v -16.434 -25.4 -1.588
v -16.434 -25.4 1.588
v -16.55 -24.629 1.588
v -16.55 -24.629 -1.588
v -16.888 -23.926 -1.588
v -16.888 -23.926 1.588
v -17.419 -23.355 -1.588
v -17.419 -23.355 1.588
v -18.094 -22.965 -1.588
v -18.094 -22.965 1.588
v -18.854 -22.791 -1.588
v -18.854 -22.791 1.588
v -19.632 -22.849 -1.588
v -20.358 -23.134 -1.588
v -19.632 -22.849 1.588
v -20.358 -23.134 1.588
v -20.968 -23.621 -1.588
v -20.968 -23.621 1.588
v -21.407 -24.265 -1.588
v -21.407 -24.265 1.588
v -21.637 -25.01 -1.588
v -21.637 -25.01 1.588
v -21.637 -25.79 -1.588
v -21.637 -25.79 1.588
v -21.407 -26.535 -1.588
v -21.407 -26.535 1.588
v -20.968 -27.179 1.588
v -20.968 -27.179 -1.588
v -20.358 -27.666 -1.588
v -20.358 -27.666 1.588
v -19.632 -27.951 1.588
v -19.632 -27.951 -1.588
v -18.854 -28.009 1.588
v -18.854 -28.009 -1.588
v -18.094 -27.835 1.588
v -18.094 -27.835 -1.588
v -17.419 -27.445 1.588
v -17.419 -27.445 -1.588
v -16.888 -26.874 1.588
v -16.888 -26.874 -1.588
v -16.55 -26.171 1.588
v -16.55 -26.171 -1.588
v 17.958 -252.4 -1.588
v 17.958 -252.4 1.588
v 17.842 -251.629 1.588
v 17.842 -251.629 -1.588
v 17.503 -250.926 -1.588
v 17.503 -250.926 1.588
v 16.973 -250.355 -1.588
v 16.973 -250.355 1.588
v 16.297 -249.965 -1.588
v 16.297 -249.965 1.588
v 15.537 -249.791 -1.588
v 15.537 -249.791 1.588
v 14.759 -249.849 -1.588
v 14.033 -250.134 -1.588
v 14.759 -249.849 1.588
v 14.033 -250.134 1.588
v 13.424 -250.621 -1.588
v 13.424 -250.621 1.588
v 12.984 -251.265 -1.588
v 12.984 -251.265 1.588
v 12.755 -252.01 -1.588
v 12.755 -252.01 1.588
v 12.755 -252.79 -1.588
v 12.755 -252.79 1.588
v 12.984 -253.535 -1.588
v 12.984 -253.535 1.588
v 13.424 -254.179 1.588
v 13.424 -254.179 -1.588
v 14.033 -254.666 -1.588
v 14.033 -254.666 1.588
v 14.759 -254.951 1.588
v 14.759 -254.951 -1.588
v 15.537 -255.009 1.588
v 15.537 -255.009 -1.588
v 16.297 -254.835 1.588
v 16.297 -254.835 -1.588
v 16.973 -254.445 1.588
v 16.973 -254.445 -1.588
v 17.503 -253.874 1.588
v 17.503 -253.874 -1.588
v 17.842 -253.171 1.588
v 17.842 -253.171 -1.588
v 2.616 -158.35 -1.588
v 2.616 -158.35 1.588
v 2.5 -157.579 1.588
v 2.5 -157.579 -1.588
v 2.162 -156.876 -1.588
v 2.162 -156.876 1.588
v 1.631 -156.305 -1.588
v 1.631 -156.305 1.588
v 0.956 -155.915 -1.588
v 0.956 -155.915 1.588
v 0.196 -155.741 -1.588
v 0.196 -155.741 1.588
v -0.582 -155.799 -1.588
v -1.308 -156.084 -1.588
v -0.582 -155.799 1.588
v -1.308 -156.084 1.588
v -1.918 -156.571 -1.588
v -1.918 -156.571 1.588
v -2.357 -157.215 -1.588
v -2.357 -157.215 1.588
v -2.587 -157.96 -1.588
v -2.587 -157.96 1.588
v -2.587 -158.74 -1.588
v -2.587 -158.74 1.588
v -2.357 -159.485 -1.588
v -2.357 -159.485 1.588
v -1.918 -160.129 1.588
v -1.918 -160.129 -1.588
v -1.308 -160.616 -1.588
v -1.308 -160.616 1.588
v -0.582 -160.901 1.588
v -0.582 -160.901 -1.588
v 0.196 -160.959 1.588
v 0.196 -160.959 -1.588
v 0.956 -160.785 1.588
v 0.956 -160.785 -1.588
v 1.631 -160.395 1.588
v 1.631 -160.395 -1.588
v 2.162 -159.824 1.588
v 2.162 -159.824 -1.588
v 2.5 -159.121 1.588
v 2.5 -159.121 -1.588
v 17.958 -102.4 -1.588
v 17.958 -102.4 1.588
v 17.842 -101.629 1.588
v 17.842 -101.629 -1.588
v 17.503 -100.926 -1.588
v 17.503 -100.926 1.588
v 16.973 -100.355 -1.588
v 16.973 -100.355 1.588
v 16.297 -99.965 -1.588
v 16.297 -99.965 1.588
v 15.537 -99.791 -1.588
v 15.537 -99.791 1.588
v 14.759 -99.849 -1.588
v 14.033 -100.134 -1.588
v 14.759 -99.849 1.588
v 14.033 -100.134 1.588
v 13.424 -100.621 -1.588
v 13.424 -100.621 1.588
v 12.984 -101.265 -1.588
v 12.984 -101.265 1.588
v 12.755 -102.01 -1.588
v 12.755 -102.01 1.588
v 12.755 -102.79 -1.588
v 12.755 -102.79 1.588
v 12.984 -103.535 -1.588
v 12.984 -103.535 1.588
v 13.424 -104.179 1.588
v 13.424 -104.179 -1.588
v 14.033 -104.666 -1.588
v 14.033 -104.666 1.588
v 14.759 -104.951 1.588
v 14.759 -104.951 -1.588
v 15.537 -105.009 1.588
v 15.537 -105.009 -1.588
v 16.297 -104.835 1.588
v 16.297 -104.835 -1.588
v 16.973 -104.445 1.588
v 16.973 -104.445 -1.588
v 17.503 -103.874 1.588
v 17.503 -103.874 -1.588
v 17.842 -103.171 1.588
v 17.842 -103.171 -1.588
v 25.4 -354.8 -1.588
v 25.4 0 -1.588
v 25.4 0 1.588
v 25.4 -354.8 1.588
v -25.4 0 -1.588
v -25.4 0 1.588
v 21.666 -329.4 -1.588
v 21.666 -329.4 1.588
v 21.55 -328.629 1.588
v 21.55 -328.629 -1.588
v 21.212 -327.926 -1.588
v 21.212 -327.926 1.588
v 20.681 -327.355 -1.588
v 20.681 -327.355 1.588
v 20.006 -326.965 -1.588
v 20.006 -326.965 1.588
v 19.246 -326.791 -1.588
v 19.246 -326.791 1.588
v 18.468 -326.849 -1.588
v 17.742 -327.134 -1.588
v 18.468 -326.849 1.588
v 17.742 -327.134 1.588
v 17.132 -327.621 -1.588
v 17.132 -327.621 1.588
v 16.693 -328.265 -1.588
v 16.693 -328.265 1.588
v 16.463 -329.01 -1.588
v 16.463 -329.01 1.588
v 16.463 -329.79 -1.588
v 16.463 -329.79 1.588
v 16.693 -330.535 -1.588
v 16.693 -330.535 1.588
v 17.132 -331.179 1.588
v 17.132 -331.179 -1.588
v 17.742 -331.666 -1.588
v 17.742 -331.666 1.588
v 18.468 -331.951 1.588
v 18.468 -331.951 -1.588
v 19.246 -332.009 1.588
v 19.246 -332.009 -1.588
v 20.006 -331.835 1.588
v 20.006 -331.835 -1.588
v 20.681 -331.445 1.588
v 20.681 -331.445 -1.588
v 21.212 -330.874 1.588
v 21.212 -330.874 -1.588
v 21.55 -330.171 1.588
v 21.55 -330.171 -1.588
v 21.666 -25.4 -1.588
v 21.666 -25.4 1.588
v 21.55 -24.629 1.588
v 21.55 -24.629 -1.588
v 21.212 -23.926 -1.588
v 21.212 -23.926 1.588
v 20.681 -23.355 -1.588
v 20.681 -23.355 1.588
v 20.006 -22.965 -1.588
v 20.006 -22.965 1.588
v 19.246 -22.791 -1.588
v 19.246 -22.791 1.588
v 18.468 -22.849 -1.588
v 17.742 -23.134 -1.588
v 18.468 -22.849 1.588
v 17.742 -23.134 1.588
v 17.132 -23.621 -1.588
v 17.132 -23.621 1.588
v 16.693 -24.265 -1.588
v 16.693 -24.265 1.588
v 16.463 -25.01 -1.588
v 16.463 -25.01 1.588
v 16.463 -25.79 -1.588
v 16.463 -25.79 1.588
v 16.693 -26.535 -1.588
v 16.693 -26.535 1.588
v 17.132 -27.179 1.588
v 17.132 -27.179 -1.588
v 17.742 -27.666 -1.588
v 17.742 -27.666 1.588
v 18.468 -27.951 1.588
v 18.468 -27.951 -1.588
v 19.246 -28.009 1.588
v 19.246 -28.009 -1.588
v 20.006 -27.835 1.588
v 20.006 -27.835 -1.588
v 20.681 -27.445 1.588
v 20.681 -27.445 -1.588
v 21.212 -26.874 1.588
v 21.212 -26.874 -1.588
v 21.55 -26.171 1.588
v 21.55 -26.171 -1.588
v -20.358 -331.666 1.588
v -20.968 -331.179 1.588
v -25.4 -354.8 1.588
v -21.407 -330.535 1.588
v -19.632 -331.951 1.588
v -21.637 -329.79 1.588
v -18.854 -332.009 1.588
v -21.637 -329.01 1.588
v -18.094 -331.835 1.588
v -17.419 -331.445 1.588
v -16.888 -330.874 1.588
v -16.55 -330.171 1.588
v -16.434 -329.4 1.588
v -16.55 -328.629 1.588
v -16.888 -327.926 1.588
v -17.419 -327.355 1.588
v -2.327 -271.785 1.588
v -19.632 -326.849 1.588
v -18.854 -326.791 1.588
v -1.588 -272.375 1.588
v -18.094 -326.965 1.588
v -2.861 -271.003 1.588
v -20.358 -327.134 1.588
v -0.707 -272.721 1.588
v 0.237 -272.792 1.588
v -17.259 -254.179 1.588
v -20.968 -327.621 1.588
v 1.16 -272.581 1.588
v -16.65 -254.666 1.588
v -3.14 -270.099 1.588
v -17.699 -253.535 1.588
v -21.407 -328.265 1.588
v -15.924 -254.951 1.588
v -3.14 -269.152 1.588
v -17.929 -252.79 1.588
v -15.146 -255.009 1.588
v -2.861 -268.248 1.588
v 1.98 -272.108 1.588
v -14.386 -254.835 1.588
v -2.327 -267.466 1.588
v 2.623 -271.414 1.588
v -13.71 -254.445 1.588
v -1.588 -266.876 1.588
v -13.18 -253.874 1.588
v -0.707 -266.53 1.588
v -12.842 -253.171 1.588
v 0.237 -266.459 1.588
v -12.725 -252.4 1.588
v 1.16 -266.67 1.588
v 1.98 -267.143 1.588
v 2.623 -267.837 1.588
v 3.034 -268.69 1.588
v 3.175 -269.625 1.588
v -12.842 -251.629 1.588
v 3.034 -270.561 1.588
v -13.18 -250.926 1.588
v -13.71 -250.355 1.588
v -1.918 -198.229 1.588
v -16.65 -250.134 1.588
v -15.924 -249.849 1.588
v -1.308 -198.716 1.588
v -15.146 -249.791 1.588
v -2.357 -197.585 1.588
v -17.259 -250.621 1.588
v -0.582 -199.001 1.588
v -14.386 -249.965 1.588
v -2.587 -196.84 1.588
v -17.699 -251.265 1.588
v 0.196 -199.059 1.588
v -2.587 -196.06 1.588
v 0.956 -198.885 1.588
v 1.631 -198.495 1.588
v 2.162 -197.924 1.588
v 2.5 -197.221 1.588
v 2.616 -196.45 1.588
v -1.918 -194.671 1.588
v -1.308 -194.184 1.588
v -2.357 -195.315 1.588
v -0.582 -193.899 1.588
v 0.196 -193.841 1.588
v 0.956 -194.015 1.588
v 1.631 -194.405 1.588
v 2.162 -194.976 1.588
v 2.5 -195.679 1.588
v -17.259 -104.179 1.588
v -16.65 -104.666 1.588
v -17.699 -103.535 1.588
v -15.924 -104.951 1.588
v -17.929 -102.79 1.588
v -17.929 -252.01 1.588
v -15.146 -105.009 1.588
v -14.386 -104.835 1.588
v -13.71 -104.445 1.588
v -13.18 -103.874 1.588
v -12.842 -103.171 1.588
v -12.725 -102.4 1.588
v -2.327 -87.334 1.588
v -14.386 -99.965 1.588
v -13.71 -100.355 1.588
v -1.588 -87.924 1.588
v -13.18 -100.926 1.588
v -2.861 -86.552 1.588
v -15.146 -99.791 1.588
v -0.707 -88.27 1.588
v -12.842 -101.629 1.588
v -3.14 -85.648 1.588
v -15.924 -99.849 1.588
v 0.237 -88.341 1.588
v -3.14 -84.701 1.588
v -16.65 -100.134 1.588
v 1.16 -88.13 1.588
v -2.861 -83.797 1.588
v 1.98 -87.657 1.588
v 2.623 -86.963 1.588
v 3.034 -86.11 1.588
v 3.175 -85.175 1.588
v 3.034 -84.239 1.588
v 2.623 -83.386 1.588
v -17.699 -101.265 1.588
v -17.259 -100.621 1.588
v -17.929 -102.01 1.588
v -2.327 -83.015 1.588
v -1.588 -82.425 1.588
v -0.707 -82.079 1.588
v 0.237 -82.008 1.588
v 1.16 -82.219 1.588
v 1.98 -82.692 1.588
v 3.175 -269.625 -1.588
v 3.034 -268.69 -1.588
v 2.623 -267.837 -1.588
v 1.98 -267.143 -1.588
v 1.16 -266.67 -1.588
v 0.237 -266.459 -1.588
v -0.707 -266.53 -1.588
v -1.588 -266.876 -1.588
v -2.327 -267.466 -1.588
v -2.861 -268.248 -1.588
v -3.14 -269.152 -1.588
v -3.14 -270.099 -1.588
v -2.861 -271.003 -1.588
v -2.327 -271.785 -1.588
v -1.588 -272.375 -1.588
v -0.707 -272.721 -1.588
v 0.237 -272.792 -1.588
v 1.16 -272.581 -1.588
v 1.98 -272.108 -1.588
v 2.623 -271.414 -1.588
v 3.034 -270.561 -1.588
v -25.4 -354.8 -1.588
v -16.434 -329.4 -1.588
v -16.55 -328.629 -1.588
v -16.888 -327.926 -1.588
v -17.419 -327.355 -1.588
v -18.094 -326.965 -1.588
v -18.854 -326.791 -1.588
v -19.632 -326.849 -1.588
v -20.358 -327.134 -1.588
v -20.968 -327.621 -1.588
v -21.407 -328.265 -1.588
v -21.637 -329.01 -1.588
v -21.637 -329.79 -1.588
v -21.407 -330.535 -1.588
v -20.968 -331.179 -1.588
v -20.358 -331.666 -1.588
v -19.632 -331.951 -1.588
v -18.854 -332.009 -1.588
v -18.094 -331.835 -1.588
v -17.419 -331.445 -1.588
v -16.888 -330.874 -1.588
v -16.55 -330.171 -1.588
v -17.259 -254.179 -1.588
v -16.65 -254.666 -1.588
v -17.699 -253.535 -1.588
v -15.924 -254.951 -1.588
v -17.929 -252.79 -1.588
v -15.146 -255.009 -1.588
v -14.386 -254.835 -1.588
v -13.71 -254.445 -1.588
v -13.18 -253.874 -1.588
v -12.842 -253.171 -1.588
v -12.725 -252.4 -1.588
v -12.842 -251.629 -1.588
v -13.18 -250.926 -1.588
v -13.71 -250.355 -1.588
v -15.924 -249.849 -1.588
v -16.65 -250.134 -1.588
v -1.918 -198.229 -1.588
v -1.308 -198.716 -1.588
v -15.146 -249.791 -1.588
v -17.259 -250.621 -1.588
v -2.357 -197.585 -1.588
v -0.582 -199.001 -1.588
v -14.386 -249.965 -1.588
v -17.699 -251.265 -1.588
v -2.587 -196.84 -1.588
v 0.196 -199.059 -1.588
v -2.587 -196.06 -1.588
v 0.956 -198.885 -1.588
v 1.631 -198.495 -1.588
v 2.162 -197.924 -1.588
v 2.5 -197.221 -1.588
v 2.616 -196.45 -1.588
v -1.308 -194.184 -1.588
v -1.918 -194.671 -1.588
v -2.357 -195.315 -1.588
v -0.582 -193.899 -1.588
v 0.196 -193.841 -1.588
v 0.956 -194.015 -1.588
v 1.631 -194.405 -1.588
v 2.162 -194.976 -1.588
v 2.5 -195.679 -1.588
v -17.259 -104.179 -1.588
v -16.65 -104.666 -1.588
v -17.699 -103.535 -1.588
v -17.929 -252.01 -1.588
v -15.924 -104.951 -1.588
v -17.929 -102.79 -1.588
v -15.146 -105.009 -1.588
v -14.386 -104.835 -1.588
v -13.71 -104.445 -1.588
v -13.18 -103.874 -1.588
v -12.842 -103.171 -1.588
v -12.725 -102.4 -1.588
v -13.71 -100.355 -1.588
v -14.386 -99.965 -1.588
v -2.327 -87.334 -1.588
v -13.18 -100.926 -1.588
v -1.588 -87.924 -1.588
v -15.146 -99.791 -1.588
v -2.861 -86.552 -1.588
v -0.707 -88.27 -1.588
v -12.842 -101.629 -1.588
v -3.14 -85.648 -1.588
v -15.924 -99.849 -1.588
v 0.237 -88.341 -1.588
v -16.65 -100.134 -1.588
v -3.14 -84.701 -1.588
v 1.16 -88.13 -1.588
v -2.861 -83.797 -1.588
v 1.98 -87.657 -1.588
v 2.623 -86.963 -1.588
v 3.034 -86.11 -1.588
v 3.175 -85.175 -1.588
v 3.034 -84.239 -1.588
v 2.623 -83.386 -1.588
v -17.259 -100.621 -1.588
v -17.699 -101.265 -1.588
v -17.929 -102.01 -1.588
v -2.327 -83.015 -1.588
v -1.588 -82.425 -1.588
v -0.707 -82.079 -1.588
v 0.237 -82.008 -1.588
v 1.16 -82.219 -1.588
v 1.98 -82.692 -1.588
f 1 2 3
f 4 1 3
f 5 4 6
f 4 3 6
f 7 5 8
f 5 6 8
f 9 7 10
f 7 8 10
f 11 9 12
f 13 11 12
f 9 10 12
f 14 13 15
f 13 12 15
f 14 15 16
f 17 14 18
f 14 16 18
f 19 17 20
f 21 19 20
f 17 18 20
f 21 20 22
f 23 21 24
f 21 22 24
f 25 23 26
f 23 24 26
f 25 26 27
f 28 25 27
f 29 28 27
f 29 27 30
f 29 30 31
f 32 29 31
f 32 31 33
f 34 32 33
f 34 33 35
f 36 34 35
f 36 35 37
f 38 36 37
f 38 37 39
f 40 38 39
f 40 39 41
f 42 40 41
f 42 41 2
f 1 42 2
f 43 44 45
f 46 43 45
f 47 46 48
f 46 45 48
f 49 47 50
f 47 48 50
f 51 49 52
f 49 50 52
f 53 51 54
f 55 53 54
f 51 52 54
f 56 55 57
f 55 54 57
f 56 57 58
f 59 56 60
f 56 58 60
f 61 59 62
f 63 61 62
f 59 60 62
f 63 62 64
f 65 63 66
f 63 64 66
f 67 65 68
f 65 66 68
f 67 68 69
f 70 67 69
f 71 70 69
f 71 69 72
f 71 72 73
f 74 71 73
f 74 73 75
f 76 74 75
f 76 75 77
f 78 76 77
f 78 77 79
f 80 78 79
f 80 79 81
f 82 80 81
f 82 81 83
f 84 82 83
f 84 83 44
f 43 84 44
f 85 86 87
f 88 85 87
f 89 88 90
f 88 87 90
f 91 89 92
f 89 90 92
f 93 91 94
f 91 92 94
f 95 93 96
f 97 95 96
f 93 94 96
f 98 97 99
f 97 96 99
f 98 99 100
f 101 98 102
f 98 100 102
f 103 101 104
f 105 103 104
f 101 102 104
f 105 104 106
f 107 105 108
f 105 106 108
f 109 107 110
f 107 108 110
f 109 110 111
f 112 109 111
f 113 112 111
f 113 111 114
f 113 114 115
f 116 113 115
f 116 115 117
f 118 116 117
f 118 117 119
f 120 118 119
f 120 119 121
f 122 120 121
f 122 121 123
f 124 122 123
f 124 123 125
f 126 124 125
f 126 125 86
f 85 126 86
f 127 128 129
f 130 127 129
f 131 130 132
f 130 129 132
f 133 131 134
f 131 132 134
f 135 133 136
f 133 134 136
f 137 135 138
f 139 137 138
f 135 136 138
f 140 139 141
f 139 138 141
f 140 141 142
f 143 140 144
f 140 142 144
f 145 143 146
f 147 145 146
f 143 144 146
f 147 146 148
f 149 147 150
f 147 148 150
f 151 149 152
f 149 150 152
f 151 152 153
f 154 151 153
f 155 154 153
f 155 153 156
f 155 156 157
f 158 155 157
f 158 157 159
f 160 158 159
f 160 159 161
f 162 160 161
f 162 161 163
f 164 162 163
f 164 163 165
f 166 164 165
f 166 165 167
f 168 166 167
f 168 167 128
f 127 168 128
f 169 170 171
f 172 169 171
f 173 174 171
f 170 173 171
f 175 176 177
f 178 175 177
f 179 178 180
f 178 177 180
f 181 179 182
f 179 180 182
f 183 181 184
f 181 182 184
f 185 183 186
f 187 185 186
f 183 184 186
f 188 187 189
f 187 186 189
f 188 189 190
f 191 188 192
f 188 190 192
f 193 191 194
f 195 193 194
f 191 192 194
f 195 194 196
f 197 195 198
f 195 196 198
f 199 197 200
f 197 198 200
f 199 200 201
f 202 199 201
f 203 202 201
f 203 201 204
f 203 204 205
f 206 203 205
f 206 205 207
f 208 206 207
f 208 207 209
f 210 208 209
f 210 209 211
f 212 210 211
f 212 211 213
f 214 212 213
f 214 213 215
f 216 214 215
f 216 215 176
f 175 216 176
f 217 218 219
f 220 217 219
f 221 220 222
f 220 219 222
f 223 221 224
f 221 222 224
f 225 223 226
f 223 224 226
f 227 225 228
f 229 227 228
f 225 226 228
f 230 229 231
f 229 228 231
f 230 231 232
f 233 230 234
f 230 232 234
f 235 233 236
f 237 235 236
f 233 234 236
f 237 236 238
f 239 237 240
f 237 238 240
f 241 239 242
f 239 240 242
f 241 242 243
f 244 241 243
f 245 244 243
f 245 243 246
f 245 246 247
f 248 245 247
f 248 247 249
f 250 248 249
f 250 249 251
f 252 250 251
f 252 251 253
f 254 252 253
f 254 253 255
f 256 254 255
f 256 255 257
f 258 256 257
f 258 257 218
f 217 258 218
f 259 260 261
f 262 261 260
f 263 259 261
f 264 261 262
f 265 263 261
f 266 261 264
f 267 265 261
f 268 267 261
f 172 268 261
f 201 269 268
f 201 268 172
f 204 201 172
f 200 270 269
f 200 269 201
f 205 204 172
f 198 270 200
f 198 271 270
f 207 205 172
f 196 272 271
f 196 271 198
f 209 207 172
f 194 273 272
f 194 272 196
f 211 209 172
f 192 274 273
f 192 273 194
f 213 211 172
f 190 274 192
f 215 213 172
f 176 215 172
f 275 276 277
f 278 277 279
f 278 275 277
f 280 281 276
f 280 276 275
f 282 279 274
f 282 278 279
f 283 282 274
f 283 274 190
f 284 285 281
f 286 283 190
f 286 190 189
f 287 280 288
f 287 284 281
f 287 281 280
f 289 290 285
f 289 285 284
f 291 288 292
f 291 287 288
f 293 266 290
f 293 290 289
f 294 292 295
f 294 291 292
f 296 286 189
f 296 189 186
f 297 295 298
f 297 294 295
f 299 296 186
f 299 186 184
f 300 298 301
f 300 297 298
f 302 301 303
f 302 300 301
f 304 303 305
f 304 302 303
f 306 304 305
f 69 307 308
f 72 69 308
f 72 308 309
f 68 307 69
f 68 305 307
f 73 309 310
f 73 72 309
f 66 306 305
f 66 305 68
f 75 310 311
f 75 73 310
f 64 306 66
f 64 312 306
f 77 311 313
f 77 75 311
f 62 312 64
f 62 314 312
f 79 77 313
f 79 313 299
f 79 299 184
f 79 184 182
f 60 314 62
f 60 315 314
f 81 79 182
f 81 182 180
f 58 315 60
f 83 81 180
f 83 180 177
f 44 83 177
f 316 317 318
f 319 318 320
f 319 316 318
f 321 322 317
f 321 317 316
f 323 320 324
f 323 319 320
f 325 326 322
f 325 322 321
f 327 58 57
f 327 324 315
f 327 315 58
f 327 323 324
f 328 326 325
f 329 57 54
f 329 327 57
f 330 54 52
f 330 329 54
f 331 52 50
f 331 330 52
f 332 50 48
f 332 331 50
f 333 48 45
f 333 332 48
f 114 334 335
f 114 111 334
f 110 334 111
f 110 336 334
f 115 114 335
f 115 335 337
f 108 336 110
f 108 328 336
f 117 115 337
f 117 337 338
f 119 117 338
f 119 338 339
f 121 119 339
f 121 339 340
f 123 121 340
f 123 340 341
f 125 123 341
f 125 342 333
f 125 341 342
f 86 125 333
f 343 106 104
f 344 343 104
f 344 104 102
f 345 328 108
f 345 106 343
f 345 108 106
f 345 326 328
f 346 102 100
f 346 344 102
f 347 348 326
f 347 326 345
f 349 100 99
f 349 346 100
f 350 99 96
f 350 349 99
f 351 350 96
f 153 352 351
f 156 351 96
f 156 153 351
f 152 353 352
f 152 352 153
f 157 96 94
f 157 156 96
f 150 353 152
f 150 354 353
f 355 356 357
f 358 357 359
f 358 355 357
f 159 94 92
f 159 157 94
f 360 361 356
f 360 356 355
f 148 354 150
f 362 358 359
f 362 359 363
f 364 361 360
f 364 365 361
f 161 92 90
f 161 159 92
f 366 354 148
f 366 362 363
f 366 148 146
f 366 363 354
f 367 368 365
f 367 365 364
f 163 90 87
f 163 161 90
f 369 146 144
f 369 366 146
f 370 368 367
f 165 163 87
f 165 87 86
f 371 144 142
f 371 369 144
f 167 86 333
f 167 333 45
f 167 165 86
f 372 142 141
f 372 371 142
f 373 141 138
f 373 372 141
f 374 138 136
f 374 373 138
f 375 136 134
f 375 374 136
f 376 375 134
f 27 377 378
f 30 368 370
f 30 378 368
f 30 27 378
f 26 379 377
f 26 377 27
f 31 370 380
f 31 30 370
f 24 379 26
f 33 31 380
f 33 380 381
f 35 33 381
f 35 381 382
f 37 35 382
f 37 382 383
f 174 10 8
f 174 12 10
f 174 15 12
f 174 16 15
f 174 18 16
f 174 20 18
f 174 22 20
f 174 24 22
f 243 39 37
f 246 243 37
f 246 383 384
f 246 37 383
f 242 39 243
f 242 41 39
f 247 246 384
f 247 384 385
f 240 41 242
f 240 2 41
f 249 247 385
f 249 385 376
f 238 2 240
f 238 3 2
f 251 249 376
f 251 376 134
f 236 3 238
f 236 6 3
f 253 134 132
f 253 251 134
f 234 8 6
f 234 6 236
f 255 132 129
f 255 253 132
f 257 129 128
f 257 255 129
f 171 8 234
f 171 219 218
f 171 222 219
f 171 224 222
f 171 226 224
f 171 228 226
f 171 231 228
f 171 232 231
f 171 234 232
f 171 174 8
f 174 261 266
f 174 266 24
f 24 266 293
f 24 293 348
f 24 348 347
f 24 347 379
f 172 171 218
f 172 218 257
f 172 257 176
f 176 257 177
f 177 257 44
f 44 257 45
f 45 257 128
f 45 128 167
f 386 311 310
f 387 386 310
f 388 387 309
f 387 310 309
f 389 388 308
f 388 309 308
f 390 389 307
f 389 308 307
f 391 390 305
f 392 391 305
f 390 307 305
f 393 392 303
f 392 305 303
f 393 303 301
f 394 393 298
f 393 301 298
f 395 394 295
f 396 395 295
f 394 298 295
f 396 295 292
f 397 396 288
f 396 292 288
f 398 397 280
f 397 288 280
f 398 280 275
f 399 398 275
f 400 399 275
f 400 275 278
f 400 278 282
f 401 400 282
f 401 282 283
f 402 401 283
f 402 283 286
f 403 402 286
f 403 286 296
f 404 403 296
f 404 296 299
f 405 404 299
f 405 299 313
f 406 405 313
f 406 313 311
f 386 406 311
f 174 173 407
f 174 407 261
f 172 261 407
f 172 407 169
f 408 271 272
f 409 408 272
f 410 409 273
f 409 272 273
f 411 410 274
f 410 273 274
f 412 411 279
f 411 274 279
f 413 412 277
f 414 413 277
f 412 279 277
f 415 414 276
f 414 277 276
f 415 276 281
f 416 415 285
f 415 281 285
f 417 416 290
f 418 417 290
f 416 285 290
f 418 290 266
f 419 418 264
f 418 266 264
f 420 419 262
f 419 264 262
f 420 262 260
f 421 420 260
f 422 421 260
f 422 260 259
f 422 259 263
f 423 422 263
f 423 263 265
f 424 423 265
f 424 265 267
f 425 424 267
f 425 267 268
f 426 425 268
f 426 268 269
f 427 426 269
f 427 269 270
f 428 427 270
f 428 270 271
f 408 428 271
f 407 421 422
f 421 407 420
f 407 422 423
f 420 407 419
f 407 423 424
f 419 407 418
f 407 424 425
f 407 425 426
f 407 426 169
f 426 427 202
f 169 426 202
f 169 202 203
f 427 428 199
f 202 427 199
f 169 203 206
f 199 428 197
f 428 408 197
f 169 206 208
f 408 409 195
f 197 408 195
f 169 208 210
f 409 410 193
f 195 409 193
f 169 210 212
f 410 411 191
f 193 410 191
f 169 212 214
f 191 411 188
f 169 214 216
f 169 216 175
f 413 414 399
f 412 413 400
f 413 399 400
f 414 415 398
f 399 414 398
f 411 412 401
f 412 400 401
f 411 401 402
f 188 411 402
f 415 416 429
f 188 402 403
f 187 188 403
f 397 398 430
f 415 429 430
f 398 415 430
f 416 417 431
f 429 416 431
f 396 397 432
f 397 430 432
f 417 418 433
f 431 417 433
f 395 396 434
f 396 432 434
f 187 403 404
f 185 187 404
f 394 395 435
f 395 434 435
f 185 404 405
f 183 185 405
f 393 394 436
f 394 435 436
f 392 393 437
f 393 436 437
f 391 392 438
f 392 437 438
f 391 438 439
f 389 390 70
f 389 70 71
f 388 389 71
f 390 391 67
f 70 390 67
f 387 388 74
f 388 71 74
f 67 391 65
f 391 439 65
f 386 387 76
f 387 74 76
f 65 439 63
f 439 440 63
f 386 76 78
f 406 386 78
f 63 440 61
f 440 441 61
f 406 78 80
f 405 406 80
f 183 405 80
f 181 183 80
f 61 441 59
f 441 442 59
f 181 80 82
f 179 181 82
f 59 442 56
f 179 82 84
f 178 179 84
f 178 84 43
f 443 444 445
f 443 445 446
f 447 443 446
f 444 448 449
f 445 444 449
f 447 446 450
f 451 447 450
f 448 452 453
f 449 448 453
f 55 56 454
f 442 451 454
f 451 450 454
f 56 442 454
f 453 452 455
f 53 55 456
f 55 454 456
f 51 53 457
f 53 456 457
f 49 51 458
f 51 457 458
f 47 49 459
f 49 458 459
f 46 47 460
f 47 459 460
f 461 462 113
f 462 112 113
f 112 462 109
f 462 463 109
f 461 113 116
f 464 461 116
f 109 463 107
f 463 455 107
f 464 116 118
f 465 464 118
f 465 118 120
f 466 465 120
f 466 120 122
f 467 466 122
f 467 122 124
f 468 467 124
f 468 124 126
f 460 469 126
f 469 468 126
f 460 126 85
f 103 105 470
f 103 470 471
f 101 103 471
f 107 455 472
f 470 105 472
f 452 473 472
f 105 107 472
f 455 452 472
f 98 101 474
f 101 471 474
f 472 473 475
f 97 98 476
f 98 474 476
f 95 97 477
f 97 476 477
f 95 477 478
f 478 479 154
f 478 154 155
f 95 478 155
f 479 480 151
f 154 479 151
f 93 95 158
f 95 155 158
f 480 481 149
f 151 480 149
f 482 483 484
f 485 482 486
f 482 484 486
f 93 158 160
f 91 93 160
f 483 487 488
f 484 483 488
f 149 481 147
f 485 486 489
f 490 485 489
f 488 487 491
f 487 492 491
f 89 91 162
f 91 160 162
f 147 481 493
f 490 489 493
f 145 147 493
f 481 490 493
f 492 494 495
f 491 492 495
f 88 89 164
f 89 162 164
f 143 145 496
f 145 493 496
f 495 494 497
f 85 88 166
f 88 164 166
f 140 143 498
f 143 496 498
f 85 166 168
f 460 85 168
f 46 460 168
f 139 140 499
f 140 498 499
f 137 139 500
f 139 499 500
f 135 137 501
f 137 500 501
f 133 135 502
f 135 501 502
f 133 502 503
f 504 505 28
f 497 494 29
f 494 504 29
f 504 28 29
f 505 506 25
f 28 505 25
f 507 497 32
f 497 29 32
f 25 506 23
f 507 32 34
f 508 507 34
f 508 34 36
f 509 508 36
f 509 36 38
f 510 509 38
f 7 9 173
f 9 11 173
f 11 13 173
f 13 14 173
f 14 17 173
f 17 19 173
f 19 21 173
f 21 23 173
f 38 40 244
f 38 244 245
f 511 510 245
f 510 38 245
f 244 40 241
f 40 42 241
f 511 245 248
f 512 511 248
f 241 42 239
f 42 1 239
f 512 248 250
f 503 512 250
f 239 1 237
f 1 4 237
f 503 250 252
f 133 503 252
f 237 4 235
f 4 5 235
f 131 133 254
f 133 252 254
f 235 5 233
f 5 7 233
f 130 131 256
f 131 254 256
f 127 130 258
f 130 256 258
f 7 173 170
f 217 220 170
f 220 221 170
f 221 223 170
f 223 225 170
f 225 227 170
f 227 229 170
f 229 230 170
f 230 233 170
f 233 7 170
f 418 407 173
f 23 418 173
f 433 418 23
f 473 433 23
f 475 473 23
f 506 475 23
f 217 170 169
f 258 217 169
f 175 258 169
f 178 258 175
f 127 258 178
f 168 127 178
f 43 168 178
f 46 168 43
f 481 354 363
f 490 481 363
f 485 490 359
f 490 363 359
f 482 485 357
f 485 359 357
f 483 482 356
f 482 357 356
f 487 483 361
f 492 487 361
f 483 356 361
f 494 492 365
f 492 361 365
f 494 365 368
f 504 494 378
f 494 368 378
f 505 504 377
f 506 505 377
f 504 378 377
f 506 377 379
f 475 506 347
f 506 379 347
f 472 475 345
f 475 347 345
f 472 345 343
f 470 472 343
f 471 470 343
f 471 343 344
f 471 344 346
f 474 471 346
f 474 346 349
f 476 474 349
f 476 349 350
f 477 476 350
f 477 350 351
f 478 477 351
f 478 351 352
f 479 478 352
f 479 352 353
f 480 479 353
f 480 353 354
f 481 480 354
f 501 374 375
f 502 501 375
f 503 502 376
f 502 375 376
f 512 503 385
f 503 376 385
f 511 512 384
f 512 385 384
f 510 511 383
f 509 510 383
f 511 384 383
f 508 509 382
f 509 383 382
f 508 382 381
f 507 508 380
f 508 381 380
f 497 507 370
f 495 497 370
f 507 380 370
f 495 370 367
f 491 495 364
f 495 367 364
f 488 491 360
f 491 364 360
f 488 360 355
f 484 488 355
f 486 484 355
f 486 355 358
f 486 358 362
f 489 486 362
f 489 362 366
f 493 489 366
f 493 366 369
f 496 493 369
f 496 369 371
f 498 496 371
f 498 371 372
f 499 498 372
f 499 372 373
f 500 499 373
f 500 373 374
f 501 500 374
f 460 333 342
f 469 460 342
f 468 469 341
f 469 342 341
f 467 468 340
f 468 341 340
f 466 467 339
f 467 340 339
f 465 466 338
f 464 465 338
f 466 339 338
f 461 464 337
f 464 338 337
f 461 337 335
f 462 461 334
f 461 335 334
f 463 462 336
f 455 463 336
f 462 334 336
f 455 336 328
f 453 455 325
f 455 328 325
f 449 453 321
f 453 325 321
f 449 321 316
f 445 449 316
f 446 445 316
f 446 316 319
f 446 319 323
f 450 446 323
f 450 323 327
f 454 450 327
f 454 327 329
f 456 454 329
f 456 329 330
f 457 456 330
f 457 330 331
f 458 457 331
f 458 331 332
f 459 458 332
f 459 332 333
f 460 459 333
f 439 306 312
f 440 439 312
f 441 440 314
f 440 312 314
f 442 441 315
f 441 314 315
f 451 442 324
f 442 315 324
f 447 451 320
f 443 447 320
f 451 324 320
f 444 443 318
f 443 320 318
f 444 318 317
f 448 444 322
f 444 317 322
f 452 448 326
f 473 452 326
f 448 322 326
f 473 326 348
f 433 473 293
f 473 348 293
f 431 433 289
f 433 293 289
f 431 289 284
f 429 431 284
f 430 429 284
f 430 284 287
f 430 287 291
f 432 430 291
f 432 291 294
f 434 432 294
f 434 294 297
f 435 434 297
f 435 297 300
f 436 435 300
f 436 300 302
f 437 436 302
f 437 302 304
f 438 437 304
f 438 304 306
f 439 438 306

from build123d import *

# Parameters (mm, degrees)
F0_W     = 50.8
F0_H     = 3.175
F1_DEPTH = 354.8
F2_R     = 2.6162
F2_R_2   = 3.175
F3_DEPTH = 3.176


with BuildPart() as f1:
    # F0 (on Front) → F1 (new body)
    with BuildSketch(Plane.XZ):
        Rectangle(F0_W, F0_H)
    extrude(amount=F1_DEPTH)

    # F2 (on face) → F3 (cut, through all)
    with BuildSketch(Plane.XY.offset(1.5875)):
        with Locations((0, -158.35)):
            Circle(F2_R)
        with Locations((0, -196.45)):
            Circle(F2_R)
        with Locations((-19.05, -329.4)):
            Circle(F2_R)
        with Locations((19.05, -329.4)):
            Circle(F2_R)
        with Locations((19.05, -25.4)):
            Circle(F2_R)
        with Locations((-19.05, -25.4)):
            Circle(F2_R)
        with Locations((-15.3416, -252.4)):
            Circle(F2_R)
        with Locations((15.3416, -252.4)):
            Circle(F2_R)
        with Locations((15.3416, -102.4)):
            Circle(F2_R)
        with Locations((-15.3416, -102.4)):
            Circle(F2_R)
        with Locations((0, -269.6254)):
            Circle(F2_R_2)
        with Locations((0, -85.1746)):
            Circle(F2_R_2)
    extrude(amount=-F3_DEPTH, mode=Mode.SUBTRACT)


solid = f1.part
